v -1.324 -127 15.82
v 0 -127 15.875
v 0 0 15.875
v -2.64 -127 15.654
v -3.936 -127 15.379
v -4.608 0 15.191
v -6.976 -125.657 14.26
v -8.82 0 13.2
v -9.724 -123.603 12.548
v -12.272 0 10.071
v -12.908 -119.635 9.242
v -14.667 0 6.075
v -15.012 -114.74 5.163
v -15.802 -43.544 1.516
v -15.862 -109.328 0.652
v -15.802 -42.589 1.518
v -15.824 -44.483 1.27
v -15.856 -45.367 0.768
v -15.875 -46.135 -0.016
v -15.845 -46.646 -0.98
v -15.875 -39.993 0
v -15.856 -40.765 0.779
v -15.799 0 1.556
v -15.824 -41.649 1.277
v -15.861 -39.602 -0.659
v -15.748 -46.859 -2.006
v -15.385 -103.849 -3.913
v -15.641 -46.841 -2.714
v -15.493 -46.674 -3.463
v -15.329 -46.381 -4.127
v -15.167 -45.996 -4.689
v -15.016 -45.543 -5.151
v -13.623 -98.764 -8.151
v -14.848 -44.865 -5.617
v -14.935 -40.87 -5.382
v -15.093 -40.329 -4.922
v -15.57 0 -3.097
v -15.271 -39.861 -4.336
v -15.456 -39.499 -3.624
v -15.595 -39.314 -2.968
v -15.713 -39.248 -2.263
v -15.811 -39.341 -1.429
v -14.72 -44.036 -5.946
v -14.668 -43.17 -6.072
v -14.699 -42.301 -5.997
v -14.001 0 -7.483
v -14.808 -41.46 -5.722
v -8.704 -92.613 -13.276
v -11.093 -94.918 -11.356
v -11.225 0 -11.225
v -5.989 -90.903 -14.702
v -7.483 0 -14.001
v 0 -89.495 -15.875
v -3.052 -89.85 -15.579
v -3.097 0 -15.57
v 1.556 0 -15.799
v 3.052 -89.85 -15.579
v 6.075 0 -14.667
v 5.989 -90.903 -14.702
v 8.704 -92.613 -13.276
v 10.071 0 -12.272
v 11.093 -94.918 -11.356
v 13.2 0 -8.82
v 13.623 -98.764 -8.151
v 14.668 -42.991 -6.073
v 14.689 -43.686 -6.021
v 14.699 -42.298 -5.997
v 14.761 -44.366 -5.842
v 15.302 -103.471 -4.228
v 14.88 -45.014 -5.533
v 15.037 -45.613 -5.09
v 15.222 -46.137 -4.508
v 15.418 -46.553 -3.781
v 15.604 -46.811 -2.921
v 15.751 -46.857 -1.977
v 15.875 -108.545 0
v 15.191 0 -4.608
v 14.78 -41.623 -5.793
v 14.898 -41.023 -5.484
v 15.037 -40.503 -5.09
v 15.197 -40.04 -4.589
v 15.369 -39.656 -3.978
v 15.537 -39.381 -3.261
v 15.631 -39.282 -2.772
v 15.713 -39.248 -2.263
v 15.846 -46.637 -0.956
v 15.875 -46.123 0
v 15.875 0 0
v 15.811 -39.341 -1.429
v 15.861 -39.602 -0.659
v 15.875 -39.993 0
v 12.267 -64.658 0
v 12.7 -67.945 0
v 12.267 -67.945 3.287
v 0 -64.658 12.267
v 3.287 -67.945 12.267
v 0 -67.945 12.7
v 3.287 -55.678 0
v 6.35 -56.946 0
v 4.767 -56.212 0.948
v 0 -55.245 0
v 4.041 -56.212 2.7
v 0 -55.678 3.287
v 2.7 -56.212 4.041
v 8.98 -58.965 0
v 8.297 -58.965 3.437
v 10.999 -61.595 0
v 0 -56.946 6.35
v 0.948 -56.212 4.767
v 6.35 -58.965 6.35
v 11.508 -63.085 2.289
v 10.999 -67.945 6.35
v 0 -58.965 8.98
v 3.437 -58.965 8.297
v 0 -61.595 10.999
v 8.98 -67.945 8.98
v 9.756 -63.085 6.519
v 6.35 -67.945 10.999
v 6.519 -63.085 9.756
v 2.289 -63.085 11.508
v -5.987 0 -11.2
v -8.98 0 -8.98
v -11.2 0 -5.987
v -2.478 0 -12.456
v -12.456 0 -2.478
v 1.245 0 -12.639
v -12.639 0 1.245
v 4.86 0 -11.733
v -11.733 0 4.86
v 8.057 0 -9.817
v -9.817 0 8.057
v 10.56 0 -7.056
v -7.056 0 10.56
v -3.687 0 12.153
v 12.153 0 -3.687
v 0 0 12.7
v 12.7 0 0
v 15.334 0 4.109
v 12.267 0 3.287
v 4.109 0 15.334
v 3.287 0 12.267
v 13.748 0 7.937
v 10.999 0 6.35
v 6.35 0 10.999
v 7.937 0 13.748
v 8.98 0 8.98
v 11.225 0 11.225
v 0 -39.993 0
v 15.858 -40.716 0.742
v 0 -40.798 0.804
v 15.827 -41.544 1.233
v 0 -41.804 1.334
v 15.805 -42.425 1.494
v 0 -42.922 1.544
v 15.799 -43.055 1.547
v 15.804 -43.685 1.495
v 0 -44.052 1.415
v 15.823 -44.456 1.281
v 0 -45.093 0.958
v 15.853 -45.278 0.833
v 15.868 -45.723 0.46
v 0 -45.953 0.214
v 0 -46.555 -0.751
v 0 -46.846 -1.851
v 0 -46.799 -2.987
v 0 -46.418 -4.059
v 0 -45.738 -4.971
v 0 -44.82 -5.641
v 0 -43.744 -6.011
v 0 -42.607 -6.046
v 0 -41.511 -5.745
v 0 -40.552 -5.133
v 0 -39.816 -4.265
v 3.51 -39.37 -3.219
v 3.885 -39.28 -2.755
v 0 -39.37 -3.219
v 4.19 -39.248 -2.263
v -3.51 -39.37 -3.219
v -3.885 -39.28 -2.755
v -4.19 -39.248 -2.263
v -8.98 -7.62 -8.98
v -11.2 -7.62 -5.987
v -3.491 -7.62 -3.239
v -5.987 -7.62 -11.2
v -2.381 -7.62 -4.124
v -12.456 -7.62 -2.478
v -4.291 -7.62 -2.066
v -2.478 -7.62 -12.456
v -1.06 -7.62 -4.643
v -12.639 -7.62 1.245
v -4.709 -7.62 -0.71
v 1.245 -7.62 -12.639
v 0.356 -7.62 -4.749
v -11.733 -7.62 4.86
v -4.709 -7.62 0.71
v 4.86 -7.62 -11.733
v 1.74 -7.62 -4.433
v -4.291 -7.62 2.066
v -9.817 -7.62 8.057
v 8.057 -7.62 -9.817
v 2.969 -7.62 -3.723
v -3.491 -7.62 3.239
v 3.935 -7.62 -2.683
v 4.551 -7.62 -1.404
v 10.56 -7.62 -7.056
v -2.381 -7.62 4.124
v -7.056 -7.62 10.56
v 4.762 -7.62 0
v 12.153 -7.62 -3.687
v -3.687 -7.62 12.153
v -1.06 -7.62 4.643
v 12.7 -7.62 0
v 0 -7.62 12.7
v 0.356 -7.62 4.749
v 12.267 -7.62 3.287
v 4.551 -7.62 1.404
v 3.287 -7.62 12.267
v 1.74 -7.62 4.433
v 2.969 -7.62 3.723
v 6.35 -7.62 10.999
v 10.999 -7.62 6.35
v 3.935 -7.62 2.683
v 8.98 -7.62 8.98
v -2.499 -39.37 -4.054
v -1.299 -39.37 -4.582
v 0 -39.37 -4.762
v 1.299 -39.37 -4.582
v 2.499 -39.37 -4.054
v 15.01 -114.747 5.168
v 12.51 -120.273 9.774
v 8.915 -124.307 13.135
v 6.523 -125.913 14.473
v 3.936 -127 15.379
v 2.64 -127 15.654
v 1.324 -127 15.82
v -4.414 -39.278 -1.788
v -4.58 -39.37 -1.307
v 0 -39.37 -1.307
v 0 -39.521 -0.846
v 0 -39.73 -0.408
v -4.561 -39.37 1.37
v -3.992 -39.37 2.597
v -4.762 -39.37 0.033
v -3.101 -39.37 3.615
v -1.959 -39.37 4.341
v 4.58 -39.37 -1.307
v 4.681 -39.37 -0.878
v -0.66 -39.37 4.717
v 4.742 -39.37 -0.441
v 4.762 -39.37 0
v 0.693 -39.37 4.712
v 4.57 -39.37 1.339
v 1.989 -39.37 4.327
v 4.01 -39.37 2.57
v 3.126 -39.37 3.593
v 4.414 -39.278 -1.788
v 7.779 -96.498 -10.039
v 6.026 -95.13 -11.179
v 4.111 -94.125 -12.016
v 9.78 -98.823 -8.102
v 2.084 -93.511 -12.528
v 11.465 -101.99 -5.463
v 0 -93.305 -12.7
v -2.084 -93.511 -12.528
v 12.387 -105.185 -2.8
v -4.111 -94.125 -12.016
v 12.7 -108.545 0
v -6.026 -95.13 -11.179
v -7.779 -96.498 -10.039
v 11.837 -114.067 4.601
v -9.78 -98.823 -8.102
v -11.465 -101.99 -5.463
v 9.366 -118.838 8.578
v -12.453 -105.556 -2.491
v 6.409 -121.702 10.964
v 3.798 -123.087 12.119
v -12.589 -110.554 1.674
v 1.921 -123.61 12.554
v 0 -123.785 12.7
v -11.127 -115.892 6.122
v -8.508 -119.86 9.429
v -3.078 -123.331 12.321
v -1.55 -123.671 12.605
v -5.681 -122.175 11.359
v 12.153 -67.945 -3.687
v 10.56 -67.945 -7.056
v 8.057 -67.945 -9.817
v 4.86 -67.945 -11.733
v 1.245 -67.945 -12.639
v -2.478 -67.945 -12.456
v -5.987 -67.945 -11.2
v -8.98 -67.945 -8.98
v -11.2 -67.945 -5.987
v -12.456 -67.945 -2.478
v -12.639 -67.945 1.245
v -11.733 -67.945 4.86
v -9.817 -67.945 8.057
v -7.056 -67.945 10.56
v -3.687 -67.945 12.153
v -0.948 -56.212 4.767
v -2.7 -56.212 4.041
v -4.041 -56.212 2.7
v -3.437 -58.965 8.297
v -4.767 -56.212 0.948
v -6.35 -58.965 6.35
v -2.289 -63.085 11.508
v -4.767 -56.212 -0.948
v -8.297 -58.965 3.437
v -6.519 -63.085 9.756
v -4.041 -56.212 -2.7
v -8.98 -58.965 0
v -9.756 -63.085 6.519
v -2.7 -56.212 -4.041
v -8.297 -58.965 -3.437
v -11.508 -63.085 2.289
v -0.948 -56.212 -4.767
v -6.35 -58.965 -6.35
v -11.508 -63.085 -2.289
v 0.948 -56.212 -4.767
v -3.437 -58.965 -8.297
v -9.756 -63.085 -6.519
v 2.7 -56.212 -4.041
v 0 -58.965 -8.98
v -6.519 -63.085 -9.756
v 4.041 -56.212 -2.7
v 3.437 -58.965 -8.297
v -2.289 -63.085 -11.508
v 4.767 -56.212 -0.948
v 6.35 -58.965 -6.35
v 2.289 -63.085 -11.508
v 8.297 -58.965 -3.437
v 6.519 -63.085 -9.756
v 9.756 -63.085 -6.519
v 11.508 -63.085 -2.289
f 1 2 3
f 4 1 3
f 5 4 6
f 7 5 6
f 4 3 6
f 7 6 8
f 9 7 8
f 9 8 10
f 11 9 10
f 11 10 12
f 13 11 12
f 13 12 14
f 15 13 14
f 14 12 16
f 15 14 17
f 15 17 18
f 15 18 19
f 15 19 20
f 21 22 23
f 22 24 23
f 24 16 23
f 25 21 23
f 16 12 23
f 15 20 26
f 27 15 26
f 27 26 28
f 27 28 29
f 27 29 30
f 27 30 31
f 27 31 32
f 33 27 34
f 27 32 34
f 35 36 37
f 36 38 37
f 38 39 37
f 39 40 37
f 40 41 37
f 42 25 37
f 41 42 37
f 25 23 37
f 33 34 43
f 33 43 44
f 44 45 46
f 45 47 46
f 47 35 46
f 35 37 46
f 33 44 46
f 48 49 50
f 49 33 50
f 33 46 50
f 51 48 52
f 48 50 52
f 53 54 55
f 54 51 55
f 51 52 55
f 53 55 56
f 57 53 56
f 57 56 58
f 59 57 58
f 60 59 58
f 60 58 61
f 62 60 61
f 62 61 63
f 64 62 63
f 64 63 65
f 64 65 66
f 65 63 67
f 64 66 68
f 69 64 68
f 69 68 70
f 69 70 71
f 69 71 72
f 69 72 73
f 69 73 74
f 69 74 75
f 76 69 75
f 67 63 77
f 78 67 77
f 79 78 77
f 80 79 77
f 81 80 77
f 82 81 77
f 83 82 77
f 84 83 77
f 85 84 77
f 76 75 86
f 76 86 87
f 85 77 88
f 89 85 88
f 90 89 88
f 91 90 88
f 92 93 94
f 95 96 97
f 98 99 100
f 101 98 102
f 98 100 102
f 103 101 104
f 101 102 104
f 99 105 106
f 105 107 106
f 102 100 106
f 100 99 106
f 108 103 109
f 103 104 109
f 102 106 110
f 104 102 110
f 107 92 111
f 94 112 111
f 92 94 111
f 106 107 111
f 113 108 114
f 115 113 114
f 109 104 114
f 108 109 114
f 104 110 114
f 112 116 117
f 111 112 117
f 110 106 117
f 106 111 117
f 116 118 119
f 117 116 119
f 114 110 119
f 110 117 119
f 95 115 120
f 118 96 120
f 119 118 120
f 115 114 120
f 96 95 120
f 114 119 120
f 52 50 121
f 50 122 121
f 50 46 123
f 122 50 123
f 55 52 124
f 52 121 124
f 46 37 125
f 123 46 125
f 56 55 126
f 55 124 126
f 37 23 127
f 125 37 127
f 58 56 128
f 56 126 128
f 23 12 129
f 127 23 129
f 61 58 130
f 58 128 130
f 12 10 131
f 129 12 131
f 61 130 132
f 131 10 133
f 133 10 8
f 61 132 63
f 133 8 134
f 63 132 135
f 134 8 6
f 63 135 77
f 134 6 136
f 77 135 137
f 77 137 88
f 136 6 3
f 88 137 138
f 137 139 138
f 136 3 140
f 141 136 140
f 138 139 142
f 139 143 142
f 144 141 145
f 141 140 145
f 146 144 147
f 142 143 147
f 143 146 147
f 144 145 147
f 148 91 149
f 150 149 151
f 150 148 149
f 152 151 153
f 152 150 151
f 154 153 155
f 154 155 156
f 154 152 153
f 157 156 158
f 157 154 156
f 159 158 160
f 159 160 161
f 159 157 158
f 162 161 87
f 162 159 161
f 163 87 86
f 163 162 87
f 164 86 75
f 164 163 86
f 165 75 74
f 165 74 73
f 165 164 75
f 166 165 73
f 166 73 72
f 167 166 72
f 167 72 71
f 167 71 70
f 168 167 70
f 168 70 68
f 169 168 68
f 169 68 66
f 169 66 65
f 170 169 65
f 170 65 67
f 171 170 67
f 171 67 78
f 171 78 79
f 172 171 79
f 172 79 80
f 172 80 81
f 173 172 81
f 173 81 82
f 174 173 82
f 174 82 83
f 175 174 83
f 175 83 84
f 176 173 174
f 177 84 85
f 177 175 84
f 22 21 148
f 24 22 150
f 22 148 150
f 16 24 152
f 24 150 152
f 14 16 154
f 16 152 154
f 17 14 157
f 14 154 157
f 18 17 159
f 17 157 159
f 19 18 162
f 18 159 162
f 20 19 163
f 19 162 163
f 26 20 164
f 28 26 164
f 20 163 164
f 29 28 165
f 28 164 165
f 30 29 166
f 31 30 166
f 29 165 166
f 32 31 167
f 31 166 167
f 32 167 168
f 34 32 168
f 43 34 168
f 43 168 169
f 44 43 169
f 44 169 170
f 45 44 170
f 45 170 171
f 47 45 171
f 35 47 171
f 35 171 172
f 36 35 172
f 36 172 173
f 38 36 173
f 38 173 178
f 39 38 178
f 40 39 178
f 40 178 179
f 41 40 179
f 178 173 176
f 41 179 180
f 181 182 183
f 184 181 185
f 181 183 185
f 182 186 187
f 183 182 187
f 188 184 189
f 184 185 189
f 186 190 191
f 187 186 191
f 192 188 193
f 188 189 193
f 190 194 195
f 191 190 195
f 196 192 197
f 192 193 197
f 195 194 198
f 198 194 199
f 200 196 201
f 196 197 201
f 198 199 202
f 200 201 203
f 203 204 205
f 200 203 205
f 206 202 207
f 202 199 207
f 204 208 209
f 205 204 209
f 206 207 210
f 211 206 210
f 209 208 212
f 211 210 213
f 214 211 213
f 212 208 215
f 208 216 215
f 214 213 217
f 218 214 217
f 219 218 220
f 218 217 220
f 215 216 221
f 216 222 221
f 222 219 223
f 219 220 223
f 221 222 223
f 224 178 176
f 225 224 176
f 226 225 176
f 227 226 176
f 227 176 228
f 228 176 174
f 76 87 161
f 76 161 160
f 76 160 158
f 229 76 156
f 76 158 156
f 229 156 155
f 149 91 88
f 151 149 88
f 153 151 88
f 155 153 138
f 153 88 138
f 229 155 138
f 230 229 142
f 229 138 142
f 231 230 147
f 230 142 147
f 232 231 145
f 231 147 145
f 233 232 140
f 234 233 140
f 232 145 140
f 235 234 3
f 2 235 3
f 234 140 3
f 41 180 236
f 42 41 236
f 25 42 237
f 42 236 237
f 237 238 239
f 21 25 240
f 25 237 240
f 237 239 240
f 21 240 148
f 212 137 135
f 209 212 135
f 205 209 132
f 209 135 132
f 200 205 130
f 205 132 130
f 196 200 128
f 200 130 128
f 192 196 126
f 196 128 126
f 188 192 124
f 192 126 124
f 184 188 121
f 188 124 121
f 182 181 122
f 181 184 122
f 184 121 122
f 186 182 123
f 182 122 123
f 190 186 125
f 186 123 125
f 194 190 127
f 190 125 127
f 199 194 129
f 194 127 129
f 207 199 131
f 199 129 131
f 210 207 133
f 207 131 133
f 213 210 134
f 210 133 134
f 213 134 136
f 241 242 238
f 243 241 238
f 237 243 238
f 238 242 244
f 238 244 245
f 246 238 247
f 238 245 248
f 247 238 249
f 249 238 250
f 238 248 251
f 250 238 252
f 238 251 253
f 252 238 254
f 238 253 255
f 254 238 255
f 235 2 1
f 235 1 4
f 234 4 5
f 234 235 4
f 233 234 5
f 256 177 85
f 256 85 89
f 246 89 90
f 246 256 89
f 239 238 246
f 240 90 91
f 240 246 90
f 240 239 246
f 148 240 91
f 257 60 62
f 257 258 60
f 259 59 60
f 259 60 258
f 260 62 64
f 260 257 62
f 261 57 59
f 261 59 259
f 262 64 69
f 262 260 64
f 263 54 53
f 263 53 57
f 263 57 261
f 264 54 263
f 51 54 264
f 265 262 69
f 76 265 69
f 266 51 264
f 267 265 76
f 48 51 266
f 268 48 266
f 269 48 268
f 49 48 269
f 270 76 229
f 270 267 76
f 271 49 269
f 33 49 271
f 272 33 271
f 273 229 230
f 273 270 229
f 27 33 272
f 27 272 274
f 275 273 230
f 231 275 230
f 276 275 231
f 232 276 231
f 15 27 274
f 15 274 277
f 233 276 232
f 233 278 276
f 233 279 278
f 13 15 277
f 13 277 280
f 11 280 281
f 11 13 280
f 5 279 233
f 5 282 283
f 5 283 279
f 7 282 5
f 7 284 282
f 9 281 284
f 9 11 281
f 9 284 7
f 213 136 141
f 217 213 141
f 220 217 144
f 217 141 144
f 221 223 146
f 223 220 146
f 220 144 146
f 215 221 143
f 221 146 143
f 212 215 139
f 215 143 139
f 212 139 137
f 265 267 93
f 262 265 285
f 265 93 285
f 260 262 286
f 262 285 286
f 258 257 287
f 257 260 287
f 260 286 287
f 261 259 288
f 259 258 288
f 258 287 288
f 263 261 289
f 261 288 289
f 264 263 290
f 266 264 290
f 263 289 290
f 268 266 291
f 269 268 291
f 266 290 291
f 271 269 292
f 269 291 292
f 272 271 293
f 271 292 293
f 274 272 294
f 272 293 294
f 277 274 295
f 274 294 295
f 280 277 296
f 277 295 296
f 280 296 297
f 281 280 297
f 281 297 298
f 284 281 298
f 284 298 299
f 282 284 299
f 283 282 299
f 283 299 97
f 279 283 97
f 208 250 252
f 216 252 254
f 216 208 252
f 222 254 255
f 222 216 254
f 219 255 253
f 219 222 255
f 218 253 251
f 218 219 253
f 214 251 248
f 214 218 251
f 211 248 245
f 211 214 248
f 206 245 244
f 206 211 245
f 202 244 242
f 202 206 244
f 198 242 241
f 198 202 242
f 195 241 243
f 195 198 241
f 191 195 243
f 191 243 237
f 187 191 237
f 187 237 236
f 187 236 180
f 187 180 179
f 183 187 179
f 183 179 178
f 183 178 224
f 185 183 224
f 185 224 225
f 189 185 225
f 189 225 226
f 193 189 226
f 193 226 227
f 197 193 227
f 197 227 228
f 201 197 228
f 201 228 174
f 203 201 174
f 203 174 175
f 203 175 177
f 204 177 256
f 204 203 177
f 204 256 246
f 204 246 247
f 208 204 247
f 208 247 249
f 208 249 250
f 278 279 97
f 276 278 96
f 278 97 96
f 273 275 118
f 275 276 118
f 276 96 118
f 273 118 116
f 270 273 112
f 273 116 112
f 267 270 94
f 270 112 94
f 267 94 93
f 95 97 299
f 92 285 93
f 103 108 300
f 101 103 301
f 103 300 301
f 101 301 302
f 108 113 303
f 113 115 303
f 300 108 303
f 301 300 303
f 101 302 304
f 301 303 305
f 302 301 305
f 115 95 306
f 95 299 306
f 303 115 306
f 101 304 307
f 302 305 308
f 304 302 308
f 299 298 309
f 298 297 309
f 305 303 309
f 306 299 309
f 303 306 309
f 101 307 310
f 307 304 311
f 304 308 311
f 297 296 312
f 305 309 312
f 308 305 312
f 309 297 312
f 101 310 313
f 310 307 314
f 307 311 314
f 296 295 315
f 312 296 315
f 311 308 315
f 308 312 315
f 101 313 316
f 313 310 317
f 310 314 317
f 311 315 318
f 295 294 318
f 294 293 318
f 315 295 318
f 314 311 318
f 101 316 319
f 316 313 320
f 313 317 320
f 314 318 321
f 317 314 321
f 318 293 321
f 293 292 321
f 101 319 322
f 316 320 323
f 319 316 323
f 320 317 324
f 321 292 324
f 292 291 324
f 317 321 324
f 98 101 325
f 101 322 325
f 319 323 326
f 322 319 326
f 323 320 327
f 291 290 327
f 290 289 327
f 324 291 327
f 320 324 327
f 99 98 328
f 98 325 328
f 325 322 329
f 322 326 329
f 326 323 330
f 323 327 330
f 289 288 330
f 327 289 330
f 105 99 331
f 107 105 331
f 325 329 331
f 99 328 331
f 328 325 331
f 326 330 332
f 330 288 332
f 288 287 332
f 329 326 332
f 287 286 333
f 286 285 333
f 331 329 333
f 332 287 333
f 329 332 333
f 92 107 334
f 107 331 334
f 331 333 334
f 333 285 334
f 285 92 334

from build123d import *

# Parameters (mm, degrees)
F1_DEPTH       = 127
F3_R           = 12.7
F4_DEPTH       = 40.005
F5_R           = 4.7625
F6_DEPTH       = 31.75
F8_DEPTH       = 25.4
F8_DEPTH_BACK  = 25.4
F10_DEPTH      = 25.4
F10_DEPTH_BACK = 25.4
F12_R          = 12.7
F13_DEPTH      = 7.62
F14_R          = 12.7


with BuildPart() as f1:
    # F0 (on Front) → F1 (new body)
    with BuildSketch(Plane.XZ):
        with BuildLine():
            ThreePointArc((0, 15.875), (-11.2253201513, -11.2253201513), (15.875, 0))
            ThreePointArc((15.875, 0), (11.2253201513, 11.2253201513), (0, 15.875))
        make_face()
        with BuildLine():
            ThreePointArc((12.7, 0), (-8.9802561211, -8.9802561211), (0, 12.7))
            ThreePointArc((0, 12.7), (8.9802561211, 8.9802561211), (12.7, 0))
        make_face(mode=Mode.SUBTRACT)
    extrude(amount=F1_DEPTH)

    # F3 (on offset) → F4 (join)
    with BuildSketch(Plane.XZ.offset(7.62)):
        Circle(F3_R)
    extrude(amount=F4_DEPTH)

    # F5 (on offset) → F6 (cut)
    with BuildSketch(Plane.XZ.offset(7.62)):
        Circle(F5_R)
    extrude(amount=F6_DEPTH, mode=Mode.SUBTRACT)

    # F7 (on Right) → F8 (cut, two sides)
    with BuildSketch(Plane.YZ) as f8_sk:
        Polygon((-89.1579282522, -16.1558650434), (-127.2579282522, 15.5941349566), (-127.2579282522, -16.1558650434), align=None)
    extrude(amount=-F8_DEPTH, mode=Mode.SUBTRACT)
    extrude(f8_sk.sketch, amount=F8_DEPTH_BACK, mode=Mode.SUBTRACT)

    # F9 (on Right) → F10 (cut, two sides)
    with BuildSketch(Plane.YZ) as f10_sk:
        with BuildLine():
            ThreePointArc((-39.9931731398, 0), (-46.6771131967, -3.4545031169), (-39.2481569672, -2.2631778847))
            ThreePointArc((-39.2481569672, -2.2631778847), (-39.4392007377, -1.0718526525), (-39.9931731398, 0))
        make_face()
    extrude(amount=-F10_DEPTH, mode=Mode.SUBTRACT)
    extrude(f10_sk.sketch, amount=F10_DEPTH_BACK, mode=Mode.SUBTRACT)

    # F12 (on offset) → F13 (join)
    with BuildSketch(Plane.XZ.offset(47.625)):
        Circle(F12_R)
    extrude(amount=F13_DEPTH)

    # F14
    f14_edges = [f1.edges().sort_by_distance(p)[0] for p in [
        (0, -55.245, -12.7),
    ]]
    fillet(f14_edges, radius=F14_R)


solid = f1.part
